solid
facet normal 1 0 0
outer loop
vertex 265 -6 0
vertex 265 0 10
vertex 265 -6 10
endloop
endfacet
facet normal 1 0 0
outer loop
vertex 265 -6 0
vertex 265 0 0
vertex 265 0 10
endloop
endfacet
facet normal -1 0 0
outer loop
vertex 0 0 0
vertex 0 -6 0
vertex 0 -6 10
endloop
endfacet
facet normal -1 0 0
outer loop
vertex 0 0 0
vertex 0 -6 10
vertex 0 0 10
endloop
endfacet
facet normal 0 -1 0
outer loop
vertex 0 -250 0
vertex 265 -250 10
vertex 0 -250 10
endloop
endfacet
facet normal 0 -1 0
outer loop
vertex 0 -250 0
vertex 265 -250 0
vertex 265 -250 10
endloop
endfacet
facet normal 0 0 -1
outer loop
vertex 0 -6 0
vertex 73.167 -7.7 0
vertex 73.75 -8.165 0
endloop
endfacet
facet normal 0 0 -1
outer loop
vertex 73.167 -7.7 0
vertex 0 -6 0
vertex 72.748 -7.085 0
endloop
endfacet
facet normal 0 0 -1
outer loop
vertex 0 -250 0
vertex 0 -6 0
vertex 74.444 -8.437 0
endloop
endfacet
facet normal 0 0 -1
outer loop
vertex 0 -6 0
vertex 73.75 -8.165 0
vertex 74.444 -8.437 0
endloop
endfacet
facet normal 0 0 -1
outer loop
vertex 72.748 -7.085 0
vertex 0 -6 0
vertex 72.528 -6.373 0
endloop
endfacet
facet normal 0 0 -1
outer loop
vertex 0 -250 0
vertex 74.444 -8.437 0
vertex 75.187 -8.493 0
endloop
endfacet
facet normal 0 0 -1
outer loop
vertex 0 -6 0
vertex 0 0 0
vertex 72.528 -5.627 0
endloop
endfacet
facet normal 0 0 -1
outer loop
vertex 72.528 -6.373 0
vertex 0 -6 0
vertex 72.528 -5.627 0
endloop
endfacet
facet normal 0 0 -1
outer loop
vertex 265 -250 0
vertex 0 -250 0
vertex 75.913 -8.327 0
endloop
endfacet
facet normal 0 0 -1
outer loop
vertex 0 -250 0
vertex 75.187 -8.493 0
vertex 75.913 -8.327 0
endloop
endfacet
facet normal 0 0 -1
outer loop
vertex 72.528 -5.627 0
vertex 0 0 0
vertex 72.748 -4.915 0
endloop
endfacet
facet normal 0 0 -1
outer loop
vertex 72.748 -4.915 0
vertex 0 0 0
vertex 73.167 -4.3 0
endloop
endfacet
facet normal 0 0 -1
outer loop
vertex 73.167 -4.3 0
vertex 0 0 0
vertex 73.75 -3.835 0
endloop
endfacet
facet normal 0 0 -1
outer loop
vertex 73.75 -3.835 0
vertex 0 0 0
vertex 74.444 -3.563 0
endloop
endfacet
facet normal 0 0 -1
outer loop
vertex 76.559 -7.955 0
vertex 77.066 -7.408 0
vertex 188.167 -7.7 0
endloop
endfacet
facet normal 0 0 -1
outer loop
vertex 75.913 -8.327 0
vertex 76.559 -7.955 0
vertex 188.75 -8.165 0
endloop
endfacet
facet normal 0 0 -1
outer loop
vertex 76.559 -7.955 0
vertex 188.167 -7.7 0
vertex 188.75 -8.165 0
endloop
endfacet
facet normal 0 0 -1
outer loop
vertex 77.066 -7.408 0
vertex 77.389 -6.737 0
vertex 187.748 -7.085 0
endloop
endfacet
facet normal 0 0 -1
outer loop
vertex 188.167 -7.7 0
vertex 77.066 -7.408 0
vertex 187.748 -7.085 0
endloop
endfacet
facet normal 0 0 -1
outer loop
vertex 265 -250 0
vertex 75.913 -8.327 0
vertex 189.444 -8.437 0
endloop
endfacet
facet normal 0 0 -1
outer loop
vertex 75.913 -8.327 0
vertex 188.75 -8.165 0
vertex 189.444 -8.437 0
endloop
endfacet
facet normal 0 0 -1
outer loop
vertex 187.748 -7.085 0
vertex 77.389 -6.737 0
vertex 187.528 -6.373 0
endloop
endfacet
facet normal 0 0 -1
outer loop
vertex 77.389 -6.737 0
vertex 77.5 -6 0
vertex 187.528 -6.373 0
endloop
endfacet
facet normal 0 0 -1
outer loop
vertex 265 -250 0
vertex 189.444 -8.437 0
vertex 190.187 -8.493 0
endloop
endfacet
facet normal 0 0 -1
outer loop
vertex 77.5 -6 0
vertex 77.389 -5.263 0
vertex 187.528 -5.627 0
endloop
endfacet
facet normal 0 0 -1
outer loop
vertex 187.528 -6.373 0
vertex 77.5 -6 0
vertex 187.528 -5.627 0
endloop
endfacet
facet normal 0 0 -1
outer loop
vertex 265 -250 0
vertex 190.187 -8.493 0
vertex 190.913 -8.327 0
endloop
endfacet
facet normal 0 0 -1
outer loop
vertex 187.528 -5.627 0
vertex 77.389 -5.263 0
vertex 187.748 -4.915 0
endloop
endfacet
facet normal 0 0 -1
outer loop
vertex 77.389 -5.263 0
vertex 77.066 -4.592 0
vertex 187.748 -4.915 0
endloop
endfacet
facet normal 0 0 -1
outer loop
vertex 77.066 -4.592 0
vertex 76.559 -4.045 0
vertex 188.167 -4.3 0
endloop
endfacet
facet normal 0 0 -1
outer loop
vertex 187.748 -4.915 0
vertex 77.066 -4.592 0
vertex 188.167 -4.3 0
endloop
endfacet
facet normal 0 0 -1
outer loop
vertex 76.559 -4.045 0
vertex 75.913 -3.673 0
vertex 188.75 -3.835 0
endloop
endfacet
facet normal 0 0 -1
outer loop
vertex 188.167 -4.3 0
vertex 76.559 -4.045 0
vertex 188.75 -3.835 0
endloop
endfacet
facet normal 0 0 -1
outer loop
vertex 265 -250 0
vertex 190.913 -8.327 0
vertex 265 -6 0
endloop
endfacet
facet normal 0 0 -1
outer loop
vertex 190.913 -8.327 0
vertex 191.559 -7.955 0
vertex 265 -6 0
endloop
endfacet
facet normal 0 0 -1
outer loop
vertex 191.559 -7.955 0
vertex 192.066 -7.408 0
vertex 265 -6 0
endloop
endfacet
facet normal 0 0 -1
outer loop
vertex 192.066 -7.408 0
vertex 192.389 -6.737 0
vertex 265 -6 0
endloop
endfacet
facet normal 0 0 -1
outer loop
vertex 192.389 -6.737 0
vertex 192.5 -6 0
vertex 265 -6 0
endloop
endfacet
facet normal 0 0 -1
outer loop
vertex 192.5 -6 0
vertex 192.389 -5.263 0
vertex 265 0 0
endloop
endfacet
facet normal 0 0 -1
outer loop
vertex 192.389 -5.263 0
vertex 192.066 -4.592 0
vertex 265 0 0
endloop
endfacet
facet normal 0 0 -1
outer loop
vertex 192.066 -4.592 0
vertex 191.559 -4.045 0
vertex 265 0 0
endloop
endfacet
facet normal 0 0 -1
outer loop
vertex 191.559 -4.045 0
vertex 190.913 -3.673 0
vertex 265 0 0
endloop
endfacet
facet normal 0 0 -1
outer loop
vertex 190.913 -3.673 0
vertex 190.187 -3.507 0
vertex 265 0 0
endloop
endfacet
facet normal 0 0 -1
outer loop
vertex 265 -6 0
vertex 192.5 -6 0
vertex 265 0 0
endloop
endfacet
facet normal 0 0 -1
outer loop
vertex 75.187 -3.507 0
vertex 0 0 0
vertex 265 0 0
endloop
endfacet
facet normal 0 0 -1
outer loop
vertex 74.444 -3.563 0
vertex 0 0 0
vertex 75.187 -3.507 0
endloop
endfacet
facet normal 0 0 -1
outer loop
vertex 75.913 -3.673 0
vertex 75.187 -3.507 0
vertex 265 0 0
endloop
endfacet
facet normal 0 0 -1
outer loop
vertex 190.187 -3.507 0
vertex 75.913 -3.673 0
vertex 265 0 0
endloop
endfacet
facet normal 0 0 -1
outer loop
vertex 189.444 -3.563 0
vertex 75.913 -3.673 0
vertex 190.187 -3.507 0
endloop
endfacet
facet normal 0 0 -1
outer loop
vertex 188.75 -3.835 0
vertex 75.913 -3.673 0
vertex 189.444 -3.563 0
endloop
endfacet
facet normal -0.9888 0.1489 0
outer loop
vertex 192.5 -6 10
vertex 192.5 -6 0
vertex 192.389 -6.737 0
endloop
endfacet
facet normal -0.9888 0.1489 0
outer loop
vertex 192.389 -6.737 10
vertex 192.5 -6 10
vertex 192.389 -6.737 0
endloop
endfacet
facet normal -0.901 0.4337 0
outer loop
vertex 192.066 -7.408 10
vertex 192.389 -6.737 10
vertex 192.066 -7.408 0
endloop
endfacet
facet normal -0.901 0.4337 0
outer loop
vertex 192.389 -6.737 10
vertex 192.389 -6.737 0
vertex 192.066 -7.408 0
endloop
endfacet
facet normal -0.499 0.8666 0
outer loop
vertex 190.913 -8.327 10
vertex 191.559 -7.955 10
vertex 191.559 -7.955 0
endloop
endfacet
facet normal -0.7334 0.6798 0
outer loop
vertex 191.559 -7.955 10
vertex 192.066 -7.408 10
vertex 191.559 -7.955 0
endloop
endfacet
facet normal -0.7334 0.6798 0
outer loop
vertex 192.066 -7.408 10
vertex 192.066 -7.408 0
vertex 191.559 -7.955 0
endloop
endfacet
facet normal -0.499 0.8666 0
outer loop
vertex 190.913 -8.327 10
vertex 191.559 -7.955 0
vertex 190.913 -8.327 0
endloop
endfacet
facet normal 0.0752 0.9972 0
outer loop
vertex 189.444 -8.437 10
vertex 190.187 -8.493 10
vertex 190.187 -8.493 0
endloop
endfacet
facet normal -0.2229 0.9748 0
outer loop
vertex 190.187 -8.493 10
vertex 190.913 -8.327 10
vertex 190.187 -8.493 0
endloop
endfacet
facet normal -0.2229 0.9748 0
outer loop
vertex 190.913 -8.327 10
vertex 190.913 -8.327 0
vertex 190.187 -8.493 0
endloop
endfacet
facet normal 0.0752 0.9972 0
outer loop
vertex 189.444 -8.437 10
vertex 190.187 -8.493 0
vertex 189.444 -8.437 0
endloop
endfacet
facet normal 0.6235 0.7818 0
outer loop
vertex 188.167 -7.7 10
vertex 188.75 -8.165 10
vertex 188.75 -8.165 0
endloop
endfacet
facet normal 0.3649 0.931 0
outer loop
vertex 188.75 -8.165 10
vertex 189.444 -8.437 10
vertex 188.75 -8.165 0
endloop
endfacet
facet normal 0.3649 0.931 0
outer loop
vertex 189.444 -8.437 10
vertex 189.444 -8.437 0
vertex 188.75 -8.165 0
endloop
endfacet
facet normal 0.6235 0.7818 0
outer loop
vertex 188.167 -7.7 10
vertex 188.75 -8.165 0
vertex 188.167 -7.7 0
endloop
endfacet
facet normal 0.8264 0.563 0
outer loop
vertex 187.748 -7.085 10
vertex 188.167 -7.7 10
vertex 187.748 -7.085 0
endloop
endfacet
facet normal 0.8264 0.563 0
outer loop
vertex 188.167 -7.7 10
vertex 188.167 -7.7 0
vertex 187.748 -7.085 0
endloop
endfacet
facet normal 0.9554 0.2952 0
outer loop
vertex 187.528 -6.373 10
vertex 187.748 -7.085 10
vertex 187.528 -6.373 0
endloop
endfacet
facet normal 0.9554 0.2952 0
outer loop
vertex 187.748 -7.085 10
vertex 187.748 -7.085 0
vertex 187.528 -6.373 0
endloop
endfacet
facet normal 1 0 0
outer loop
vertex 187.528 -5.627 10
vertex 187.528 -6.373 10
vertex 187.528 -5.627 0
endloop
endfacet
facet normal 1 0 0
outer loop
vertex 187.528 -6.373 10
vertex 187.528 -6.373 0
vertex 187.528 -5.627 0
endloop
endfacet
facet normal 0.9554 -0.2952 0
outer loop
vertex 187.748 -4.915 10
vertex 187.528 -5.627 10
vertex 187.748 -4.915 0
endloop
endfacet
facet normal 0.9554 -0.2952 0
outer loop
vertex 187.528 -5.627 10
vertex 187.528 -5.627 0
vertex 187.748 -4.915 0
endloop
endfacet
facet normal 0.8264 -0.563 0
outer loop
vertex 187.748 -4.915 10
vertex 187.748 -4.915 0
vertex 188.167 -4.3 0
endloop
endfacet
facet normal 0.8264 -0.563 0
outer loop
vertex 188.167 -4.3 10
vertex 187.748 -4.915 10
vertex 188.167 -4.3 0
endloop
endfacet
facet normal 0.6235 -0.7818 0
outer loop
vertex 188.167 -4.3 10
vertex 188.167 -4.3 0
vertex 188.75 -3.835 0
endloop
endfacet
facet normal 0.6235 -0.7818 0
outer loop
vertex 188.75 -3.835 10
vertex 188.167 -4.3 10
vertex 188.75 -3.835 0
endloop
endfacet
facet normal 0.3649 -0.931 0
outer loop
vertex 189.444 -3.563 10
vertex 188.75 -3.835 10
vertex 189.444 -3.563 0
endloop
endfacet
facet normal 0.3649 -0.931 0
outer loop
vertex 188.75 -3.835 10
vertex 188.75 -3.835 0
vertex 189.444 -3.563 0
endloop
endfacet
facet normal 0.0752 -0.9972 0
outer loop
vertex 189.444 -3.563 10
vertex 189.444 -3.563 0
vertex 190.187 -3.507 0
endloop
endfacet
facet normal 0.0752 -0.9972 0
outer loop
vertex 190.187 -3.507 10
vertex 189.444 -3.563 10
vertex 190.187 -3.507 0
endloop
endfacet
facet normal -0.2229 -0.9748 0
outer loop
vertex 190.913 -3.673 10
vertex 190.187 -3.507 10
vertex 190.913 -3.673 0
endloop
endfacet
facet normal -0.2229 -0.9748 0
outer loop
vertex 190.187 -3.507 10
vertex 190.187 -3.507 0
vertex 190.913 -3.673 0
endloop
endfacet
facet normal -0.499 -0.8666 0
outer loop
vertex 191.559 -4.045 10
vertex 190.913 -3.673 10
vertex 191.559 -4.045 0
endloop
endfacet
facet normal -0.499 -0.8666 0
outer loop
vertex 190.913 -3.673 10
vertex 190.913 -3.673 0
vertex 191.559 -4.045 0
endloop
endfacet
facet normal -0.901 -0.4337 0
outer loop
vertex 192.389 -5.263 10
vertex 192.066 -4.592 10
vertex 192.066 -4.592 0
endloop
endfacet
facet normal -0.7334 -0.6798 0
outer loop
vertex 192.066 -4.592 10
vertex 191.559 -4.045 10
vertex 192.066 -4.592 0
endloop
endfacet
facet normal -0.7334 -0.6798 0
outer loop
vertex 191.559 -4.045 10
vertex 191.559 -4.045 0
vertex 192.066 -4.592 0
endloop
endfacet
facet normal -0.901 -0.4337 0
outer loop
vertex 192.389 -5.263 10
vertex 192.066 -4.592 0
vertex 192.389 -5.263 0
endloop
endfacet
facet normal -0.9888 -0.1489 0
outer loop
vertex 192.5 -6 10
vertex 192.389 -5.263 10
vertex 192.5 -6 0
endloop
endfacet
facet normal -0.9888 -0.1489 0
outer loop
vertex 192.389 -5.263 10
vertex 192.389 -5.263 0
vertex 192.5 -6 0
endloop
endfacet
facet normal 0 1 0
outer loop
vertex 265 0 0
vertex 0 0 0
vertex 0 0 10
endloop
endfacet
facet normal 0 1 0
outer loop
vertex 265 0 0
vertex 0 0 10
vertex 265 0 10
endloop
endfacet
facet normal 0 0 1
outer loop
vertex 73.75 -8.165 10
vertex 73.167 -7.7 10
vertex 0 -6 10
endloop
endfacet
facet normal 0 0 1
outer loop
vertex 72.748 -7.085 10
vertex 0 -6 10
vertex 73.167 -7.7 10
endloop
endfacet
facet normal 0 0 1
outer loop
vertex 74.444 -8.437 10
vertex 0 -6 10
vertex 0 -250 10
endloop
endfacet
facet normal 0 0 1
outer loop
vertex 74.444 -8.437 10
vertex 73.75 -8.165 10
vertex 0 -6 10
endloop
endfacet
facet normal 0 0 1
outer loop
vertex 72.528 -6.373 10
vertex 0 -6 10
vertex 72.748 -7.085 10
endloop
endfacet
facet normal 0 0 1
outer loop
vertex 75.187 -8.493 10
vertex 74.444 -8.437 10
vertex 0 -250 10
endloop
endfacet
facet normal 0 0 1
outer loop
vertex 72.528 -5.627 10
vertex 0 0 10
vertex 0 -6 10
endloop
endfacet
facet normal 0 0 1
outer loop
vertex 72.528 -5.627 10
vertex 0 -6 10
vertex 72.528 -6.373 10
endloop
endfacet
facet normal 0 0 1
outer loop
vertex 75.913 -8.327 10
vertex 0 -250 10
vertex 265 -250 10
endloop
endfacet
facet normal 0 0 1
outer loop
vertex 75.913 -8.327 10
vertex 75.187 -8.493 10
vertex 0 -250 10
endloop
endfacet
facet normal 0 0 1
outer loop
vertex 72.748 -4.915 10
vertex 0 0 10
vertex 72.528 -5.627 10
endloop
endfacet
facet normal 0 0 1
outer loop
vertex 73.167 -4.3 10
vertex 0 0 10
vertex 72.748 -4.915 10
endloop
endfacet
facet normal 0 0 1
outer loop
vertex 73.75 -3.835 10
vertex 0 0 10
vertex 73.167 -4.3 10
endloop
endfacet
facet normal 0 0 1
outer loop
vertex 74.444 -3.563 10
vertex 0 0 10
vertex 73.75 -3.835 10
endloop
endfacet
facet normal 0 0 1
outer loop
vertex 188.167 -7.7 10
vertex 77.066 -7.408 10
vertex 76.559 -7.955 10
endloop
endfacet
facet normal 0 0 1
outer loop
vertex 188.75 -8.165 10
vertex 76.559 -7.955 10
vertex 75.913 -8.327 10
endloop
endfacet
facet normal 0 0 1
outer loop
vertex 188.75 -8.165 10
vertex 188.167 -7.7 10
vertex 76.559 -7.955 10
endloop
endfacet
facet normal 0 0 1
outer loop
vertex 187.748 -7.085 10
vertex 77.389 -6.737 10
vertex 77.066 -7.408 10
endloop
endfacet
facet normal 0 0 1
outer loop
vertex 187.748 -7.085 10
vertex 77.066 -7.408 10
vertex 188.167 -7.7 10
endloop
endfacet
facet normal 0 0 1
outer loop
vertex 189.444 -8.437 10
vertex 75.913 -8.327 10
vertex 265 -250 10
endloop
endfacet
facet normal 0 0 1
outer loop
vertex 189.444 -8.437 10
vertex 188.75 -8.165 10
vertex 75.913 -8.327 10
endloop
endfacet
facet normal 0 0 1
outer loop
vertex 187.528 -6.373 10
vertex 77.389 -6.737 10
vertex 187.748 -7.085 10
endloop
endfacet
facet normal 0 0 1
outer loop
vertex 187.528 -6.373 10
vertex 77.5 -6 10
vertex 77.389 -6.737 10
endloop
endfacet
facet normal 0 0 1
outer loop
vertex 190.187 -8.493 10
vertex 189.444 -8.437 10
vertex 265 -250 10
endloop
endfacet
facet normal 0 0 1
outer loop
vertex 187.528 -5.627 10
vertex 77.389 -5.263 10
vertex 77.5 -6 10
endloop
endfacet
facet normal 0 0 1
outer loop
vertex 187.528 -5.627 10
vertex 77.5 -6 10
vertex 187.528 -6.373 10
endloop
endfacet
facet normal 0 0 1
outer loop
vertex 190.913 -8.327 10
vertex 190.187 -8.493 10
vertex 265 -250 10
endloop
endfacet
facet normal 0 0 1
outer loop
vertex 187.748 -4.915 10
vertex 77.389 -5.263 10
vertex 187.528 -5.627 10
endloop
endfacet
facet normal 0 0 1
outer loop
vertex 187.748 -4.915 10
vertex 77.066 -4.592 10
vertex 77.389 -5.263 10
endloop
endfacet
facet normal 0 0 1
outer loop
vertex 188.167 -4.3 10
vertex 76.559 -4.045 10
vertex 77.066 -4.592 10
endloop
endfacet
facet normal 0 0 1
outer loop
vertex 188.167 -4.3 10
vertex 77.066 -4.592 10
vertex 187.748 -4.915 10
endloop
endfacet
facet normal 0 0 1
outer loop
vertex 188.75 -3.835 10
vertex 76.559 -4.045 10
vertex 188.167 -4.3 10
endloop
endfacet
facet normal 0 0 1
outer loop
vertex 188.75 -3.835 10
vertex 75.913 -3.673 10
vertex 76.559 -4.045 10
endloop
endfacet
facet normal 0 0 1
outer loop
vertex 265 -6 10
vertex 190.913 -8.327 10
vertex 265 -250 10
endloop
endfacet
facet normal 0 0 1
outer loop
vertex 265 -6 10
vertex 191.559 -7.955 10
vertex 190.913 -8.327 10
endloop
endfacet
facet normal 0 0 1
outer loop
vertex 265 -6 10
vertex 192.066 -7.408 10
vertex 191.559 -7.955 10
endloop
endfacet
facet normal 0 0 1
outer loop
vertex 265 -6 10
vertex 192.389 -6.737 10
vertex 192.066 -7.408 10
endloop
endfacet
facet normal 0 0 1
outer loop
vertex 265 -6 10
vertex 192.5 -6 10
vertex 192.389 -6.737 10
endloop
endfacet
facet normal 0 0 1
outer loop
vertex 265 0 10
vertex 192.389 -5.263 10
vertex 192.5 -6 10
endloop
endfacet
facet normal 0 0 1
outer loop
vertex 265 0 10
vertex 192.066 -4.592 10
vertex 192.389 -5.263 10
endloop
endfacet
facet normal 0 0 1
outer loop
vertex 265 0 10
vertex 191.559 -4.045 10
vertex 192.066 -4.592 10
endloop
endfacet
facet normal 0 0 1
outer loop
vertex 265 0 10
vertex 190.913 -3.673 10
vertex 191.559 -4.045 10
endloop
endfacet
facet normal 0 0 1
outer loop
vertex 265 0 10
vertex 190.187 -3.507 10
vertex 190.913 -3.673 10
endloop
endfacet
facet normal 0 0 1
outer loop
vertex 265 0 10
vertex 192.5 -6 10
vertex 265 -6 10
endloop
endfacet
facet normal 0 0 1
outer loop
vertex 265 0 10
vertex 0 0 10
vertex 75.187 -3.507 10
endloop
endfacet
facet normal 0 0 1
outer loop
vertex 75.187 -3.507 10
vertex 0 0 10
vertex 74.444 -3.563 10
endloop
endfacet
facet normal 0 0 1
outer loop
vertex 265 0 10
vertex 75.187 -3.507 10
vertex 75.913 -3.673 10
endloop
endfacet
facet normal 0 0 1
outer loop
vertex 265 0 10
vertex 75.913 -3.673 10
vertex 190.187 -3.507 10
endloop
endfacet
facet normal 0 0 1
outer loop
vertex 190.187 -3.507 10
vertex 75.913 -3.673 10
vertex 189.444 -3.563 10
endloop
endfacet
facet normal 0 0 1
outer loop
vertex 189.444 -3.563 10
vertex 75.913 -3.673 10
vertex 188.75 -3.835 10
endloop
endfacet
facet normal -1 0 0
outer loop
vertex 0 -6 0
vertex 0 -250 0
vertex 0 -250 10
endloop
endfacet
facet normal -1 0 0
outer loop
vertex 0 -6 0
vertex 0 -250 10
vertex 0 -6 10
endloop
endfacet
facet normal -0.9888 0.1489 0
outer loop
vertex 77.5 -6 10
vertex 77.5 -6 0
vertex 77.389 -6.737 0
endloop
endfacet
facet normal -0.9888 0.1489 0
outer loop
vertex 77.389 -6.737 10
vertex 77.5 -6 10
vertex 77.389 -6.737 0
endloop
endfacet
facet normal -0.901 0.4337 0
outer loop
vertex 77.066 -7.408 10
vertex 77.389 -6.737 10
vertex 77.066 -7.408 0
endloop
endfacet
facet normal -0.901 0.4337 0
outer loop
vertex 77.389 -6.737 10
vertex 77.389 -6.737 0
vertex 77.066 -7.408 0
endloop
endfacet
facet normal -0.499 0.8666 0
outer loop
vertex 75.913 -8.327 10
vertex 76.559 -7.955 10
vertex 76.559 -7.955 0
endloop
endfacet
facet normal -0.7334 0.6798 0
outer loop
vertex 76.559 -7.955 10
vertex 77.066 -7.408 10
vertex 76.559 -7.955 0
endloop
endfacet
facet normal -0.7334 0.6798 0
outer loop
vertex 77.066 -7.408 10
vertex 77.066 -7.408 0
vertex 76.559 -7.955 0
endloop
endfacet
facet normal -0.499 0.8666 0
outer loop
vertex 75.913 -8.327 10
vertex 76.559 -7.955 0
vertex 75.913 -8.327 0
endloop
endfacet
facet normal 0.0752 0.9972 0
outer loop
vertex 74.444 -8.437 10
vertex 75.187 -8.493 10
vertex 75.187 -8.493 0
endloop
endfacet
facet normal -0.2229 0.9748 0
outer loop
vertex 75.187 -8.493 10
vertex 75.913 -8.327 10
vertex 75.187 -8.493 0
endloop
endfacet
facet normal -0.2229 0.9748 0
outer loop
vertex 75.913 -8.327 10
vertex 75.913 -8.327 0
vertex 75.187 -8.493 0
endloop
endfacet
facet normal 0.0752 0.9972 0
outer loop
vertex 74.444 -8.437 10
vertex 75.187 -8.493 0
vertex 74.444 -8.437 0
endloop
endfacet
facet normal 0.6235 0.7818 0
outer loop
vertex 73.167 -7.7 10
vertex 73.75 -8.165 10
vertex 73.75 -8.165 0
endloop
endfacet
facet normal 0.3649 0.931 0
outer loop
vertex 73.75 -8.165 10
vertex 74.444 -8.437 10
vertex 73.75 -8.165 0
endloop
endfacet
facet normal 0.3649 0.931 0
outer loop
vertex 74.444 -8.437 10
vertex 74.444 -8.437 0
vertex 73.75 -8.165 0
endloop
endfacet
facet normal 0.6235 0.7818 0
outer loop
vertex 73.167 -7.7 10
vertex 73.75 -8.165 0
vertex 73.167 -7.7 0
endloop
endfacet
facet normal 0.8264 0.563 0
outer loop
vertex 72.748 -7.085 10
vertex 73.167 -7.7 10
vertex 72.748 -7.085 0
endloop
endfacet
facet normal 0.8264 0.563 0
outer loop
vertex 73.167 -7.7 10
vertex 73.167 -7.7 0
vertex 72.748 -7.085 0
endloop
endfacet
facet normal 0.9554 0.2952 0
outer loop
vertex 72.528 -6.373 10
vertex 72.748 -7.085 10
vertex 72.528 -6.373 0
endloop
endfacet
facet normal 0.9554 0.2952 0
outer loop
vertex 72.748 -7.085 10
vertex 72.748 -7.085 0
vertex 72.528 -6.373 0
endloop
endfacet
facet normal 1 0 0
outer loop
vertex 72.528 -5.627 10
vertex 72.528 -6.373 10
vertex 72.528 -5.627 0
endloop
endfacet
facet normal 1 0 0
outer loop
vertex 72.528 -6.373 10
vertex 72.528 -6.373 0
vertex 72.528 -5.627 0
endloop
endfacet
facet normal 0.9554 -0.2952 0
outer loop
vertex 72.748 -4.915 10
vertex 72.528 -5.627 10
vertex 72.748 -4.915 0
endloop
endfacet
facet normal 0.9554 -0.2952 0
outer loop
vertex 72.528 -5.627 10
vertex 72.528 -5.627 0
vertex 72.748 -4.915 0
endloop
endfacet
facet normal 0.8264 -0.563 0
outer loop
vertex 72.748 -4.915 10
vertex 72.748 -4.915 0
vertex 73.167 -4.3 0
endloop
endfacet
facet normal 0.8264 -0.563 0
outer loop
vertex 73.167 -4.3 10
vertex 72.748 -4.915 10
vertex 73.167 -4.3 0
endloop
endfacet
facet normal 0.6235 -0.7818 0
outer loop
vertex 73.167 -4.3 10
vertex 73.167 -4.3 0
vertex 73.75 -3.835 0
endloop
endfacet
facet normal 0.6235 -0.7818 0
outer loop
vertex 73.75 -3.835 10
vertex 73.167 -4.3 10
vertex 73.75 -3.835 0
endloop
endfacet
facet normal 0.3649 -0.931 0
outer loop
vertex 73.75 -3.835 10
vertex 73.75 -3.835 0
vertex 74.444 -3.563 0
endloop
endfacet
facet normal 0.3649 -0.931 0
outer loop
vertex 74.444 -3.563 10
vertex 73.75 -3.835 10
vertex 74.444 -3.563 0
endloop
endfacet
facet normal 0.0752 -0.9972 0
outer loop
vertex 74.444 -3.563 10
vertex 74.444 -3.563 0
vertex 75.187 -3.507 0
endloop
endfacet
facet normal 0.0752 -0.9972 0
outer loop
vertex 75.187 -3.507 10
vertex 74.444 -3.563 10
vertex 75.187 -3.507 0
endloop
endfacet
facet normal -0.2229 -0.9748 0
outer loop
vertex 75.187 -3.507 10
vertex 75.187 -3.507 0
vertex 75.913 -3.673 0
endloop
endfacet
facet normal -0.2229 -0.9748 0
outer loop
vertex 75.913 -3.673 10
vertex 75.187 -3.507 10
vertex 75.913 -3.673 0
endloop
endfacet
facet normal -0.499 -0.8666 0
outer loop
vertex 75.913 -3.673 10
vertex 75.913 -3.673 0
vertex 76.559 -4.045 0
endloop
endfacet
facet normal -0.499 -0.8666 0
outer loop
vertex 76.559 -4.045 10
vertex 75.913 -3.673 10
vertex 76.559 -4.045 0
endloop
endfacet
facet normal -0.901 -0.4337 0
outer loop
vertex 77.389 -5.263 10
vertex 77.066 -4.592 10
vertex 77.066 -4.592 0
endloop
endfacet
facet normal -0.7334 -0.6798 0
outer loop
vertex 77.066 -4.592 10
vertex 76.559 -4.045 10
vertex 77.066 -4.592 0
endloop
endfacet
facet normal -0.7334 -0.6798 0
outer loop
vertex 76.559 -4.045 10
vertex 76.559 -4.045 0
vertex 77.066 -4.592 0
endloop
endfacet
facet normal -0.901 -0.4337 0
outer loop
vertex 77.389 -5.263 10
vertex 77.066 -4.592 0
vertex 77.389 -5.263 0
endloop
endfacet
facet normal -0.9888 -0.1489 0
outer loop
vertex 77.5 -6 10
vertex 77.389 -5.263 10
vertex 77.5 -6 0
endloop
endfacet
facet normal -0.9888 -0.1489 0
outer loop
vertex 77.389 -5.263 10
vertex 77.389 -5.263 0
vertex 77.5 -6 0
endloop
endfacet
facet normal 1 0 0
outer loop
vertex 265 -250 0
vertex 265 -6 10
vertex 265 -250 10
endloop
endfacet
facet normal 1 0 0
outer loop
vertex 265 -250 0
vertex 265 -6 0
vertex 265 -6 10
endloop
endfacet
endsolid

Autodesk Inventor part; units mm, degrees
ref_plane "YZ Plane" through (0, 0, 0) normal (1, 0, 0) x (0, 1, 0)
ref_plane "XZ Plane" through (0, 0, 0) normal (0, 1, 0) x (-1, 0, 0)
ref_plane "XY Plane" through (0, 0, 0) normal (0, 0, 1) x (1, 0, 0)
sketch "Sketch1" plane through (0, 0, 0) normal (0, 0, 1) x (1, 0, 0)
  line L0 (0, 0) -> (265, 0)
  line L1 (265, 0) -> (265, -250)
  line L2 (265, -250) -> (0, -250)
  line L3 (0, -250) -> (0, 0)
  line L4 (0, 0) -> (0, -6)
  circle A0 centre (75, -6) radius 2.5
  line L5 (265, 0) -> (265, -6)
  circle A1 centre (190, -6) radius 2.5
extrude "Extrusion1" add sketch "Sketch1" along normal blind 10
properties part number "new side wall"
